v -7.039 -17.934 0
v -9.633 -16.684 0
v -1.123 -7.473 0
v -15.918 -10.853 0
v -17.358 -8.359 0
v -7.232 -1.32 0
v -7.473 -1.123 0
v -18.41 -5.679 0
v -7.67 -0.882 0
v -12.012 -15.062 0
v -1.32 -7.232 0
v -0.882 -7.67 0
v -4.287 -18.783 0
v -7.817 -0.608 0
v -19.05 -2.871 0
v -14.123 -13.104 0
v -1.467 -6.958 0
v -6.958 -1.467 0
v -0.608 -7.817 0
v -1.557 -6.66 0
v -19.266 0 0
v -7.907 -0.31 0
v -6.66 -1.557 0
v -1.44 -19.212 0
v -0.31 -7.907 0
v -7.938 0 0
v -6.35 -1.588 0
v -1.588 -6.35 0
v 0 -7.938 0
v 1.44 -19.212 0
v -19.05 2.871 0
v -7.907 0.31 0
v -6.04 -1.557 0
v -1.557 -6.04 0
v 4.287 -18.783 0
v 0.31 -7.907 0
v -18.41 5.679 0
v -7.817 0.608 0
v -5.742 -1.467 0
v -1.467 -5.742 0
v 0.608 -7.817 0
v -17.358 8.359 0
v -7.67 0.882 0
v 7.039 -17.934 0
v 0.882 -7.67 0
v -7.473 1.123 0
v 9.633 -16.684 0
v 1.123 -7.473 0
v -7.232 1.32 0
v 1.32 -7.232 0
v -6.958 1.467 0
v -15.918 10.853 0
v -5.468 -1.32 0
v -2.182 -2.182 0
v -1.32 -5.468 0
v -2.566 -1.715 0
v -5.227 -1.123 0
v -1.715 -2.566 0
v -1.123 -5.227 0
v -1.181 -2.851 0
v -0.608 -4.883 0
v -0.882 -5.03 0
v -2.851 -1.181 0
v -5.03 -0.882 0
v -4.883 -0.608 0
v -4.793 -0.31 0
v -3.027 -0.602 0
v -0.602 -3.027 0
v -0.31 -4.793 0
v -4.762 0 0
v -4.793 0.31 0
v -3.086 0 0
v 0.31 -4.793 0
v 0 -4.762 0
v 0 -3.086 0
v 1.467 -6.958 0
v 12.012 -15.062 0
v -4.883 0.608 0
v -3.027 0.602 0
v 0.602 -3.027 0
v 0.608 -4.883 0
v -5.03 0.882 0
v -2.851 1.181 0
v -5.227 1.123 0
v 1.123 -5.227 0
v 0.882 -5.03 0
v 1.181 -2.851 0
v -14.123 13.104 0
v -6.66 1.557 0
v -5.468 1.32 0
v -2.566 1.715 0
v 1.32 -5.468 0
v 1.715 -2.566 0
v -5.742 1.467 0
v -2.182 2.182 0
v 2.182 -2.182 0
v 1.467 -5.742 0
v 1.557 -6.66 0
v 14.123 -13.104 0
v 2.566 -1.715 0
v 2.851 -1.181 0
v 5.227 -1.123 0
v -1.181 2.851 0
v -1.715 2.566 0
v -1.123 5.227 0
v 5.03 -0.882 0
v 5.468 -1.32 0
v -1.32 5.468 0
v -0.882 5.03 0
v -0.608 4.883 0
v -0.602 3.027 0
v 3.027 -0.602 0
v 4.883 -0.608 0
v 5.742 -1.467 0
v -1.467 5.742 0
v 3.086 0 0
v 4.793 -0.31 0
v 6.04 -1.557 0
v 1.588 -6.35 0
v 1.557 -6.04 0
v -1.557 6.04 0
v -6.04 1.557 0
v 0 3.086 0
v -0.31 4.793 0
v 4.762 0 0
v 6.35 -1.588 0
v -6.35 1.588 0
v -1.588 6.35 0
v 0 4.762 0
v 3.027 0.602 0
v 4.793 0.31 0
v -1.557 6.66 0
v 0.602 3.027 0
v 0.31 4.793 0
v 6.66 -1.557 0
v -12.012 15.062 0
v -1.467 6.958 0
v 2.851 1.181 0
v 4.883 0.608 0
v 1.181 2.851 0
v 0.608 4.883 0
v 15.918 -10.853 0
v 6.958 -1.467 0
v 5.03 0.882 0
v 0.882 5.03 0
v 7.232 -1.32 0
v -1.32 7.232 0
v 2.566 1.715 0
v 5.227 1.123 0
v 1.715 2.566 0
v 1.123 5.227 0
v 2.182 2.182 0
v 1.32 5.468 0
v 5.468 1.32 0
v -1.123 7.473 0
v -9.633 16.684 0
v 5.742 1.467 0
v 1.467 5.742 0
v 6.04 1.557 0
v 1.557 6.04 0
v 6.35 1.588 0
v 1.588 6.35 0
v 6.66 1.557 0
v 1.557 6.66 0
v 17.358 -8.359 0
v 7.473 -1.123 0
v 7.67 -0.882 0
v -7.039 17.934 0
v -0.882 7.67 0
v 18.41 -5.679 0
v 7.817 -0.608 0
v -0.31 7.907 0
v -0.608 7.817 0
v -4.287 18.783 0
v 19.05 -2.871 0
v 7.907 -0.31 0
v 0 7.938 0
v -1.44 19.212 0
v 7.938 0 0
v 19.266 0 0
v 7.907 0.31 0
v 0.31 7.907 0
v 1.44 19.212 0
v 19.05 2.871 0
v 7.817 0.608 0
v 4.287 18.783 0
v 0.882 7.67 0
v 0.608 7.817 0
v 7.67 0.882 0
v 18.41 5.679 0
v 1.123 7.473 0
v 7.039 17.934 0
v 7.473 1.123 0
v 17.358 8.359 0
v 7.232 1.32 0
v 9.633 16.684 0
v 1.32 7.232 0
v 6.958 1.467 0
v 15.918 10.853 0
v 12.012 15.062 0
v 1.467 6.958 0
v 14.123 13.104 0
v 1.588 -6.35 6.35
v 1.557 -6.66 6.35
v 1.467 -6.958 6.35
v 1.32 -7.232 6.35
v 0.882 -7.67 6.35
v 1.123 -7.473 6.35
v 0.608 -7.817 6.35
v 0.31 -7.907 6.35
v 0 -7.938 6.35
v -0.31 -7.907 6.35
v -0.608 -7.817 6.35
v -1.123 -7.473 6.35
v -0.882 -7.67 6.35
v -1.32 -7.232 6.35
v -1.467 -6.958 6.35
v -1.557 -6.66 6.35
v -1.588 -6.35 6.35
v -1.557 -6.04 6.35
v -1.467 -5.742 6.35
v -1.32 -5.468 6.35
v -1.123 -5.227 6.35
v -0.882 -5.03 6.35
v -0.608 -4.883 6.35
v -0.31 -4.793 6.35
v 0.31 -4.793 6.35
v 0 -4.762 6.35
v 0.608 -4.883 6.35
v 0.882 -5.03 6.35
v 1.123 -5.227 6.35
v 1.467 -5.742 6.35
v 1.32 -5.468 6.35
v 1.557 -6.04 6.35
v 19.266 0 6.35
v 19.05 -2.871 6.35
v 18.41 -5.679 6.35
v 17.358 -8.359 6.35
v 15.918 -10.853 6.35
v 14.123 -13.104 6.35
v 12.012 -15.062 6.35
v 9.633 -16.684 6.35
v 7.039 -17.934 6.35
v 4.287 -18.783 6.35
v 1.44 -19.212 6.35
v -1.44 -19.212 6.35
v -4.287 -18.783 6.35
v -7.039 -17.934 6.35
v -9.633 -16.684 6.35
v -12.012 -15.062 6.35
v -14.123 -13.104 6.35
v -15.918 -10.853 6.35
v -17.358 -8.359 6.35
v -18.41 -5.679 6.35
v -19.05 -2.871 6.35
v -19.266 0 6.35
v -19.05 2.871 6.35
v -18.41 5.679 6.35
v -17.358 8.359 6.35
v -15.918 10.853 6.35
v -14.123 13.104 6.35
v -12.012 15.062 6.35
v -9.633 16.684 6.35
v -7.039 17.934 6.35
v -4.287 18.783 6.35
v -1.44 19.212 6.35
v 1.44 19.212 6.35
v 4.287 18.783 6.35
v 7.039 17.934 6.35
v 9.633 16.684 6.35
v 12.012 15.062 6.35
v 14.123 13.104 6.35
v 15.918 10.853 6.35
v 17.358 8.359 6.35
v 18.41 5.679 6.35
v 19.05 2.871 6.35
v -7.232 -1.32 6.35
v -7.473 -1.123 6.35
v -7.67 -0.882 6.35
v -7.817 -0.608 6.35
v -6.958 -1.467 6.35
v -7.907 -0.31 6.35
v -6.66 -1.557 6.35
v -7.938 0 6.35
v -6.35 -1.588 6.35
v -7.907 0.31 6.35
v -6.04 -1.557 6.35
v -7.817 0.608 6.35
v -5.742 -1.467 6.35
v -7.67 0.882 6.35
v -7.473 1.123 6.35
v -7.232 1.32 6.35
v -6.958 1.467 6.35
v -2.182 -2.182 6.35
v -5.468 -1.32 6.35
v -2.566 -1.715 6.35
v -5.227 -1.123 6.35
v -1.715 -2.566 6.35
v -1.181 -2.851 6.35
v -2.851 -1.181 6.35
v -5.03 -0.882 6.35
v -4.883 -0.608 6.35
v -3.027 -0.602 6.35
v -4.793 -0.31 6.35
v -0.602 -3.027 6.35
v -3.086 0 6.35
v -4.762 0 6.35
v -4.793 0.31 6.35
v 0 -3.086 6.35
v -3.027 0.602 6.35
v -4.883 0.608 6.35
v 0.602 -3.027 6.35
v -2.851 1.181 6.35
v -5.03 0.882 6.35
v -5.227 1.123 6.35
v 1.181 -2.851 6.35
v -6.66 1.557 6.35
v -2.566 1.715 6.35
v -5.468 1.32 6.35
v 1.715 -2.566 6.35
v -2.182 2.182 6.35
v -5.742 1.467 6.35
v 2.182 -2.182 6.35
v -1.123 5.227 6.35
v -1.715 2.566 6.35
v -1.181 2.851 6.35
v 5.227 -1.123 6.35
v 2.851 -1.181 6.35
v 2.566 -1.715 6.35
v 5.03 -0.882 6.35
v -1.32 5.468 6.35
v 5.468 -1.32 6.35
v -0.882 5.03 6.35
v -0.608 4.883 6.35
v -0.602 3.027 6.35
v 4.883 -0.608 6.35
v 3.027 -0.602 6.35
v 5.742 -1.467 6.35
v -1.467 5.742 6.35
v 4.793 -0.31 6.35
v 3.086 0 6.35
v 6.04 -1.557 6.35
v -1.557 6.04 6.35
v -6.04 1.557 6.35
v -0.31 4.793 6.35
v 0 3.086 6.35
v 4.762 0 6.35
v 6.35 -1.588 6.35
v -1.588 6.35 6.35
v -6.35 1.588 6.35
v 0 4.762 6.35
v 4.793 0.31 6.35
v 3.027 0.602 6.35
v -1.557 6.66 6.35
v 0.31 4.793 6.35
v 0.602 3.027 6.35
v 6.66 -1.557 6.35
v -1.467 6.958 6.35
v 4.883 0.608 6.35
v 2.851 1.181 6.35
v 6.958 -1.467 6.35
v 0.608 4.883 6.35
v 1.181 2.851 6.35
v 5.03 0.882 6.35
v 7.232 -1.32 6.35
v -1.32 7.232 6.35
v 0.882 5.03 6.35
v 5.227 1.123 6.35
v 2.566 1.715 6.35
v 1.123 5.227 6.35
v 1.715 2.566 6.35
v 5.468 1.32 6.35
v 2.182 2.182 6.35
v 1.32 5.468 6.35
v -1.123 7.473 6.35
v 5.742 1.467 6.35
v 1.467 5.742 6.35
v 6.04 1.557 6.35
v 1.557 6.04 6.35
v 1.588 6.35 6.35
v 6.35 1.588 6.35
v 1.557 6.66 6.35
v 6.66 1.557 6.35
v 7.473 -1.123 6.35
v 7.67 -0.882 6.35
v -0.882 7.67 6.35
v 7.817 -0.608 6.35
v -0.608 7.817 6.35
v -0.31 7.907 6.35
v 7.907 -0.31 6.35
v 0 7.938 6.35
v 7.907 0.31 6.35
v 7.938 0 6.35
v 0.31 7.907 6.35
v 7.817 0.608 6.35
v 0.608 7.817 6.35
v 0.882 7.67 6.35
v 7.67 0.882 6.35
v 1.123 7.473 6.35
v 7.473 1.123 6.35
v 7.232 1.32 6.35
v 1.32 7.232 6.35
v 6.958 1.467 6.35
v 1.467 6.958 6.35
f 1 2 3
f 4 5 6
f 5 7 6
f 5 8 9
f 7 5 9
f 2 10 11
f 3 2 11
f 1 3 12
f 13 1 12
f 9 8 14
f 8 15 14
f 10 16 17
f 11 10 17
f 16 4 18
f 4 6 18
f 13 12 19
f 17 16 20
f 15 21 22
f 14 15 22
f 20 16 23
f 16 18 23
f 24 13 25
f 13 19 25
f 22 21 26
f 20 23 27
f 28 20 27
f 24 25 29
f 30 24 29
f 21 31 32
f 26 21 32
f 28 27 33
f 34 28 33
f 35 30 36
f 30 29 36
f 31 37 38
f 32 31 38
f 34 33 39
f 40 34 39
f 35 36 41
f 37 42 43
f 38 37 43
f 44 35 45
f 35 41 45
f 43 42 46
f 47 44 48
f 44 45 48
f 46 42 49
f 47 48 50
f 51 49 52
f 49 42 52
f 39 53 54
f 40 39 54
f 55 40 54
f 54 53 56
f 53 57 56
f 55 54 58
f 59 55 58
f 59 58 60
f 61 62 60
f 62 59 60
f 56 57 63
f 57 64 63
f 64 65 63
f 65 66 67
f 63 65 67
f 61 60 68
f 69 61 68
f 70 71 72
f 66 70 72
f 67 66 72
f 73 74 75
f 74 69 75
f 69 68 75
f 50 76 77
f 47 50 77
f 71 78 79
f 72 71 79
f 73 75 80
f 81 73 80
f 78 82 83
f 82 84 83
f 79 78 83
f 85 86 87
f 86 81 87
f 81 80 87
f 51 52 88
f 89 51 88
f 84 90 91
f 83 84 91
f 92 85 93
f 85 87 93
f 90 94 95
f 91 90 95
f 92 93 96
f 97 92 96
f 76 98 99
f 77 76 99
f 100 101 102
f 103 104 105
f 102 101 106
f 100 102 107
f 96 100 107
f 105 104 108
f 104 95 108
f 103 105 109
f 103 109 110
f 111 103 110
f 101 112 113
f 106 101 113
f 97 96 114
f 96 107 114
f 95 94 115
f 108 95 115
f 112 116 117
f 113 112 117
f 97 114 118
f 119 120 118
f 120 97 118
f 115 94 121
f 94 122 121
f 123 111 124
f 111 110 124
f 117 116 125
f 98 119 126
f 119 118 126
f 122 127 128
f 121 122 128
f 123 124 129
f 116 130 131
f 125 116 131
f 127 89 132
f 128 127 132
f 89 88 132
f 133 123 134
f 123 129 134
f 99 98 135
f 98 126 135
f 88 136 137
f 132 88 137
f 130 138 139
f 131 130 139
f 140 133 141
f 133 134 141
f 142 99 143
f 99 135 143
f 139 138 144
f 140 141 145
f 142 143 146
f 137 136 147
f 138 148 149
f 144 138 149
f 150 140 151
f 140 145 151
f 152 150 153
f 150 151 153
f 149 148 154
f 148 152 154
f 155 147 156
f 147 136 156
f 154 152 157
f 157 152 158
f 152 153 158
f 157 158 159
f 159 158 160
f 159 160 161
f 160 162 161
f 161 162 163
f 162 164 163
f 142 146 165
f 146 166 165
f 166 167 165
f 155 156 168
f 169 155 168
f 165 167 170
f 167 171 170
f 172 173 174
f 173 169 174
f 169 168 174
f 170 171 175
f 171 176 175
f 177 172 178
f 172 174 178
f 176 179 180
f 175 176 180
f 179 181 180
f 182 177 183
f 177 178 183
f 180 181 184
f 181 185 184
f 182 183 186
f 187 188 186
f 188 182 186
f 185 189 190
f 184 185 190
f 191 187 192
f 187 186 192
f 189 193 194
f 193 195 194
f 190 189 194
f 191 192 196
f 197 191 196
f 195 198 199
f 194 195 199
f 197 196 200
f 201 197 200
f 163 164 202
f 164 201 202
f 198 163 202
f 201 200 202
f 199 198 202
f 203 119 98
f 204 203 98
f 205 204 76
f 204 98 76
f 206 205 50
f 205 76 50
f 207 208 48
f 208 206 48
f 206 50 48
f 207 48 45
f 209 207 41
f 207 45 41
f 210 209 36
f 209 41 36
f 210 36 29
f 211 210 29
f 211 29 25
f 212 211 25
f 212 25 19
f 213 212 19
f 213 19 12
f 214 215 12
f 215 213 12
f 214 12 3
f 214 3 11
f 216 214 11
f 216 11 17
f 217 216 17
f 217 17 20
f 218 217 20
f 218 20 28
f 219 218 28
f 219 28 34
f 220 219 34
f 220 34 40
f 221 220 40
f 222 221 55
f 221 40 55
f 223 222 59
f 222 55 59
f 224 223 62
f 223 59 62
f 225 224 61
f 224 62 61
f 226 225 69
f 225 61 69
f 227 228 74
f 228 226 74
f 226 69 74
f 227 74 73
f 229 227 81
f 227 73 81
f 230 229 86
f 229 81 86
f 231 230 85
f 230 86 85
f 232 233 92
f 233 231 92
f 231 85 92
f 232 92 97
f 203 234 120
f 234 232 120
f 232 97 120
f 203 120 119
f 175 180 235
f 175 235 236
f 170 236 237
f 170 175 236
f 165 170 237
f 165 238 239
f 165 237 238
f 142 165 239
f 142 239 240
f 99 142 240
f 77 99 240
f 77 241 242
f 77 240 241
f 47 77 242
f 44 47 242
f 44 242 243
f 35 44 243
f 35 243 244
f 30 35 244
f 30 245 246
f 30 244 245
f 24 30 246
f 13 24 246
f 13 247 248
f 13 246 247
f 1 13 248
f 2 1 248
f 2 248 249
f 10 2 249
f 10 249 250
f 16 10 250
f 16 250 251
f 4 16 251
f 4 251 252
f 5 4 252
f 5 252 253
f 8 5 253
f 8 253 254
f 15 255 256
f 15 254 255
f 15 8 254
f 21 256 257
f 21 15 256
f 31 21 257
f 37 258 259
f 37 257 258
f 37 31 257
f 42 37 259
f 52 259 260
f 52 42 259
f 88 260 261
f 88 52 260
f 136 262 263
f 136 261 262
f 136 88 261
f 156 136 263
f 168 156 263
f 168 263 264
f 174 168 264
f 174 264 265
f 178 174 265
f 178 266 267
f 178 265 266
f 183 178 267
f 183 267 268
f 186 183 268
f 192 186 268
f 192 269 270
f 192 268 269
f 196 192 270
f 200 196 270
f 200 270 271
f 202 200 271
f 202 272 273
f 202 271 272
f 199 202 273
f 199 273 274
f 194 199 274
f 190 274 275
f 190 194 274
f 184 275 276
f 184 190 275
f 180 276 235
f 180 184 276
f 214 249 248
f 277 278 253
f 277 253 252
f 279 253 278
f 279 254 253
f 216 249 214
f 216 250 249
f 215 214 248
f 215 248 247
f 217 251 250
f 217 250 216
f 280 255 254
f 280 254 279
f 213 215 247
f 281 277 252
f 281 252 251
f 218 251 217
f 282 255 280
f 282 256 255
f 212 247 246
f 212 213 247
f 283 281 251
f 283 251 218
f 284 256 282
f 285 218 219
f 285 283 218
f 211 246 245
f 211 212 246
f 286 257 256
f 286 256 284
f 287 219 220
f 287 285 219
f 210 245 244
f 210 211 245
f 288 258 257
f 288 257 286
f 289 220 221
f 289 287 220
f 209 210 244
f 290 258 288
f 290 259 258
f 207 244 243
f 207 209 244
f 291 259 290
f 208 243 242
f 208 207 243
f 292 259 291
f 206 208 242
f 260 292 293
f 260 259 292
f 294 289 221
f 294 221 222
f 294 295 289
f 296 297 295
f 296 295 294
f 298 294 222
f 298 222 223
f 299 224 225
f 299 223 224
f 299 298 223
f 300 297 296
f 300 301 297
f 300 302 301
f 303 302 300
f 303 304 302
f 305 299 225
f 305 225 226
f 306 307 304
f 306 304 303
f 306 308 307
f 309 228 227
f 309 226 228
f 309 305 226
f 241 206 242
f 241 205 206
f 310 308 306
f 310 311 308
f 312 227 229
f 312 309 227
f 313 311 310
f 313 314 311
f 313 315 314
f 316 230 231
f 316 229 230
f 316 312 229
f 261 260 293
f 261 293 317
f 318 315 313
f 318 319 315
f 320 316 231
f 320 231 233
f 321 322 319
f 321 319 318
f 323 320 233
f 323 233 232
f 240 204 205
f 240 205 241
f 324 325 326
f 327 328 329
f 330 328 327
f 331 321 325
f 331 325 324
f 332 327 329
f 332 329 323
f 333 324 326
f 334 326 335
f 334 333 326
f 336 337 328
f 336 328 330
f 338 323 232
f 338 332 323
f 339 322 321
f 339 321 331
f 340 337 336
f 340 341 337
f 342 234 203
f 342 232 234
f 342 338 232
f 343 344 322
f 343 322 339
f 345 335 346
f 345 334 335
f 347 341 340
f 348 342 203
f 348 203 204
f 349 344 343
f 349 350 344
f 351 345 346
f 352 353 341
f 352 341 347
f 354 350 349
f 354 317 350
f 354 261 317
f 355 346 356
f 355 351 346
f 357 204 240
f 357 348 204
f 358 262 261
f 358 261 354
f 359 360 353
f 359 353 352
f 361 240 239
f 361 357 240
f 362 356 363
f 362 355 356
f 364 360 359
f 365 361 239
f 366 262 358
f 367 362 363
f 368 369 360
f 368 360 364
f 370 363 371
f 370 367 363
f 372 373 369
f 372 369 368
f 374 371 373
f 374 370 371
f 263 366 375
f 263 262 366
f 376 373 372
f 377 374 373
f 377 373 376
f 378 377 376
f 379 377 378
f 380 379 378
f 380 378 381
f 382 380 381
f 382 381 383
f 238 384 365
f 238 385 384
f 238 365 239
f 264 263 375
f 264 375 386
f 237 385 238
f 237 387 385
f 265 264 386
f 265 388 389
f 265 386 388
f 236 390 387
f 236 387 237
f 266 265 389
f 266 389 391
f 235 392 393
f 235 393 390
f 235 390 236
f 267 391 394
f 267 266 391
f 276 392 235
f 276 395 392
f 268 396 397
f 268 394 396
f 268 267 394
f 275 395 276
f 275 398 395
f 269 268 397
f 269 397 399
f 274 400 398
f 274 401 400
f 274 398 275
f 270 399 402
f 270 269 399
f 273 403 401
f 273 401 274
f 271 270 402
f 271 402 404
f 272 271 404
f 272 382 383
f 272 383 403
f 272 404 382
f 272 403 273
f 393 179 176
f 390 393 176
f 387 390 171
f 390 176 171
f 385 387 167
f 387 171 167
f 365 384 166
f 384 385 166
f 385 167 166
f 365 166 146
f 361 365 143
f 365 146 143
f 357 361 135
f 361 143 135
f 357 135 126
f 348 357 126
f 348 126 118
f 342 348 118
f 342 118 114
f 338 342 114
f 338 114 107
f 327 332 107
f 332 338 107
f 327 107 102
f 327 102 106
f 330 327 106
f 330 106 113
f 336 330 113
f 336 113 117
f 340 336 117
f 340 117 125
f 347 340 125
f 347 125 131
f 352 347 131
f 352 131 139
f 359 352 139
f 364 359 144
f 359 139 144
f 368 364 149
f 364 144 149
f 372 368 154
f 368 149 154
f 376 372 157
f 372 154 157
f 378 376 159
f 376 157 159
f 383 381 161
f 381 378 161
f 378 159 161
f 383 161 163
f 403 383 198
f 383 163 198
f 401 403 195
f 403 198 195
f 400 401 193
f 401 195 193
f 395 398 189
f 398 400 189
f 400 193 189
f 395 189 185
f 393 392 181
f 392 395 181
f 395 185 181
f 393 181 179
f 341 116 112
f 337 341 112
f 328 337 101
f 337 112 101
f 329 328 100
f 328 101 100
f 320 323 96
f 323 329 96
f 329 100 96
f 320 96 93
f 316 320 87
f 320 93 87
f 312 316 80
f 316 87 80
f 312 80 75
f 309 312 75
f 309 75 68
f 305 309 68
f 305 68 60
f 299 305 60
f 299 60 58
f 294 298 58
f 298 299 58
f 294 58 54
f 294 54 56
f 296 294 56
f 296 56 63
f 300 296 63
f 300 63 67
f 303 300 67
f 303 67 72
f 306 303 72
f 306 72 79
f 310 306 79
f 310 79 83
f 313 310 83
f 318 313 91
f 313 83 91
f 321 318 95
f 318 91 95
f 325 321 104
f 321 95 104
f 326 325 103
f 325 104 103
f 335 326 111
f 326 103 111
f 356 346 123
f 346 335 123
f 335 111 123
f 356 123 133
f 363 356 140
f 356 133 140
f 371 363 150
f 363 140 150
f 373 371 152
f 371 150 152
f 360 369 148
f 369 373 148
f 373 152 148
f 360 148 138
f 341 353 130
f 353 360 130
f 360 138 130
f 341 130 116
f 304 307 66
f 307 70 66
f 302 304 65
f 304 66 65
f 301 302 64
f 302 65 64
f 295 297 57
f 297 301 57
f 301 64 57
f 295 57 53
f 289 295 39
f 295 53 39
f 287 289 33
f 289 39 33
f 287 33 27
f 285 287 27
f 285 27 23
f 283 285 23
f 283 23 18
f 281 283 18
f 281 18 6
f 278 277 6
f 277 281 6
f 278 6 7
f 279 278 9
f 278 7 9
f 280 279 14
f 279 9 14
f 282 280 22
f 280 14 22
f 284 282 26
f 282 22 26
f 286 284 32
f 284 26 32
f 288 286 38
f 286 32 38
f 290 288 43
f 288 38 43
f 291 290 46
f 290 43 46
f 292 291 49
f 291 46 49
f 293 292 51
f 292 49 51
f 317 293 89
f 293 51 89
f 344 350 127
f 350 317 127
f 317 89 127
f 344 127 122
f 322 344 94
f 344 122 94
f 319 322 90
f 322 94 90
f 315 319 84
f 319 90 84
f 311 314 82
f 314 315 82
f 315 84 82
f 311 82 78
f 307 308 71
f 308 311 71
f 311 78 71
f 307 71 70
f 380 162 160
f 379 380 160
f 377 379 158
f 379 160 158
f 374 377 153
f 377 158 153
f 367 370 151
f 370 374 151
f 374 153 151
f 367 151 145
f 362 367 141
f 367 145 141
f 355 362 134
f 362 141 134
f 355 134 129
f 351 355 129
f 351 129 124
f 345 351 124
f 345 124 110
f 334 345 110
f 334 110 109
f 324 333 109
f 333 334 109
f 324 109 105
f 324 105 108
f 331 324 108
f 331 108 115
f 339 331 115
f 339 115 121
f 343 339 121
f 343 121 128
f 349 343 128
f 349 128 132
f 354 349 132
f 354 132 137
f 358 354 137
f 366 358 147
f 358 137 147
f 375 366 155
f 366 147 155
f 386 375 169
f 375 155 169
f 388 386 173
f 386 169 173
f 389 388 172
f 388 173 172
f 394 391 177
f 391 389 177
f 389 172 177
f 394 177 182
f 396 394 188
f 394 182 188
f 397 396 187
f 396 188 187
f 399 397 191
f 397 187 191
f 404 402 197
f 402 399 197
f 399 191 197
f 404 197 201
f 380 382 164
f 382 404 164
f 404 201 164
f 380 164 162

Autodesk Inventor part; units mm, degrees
ref_plane "YZ Plane" through (0, 0, 0) normal (1, 0, 0) x (0, 1, 0)
ref_plane "XZ Plane" through (0, 0, 0) normal (0, 1, 0) x (-1, 0, 0)
ref_plane "XY Plane" through (0, 0, 0) normal (0, 0, 1) x (1, 0, 0)
ref_plane "Work Plane1" through (0, 0, 0) normal (0, 0, 1) x (1, 0, 0)
sketch "Sketch1" plane through (0, 0, 0) normal (0, 0, 1) x (1, 0, 0)
  circle A0 centre (0, 0) radius 3.0861 projected
  circle A1 centre (6.35, 0) radius 1.5875 projected
  circle A2 centre (0, 6.35) radius 1.5875 projected
  circle A3 centre (-6.35, 0) radius 1.5875 projected
  circle A4 centre (0, -6.35) radius 1.5875 projected
  circle A5 centre (0, 0) radius 19.2656
  point P0 (0, 0)
extrude "Extrusion1" add sketch "Sketch1" along normal blind 6.35
properties part number "smallGearMag01"
